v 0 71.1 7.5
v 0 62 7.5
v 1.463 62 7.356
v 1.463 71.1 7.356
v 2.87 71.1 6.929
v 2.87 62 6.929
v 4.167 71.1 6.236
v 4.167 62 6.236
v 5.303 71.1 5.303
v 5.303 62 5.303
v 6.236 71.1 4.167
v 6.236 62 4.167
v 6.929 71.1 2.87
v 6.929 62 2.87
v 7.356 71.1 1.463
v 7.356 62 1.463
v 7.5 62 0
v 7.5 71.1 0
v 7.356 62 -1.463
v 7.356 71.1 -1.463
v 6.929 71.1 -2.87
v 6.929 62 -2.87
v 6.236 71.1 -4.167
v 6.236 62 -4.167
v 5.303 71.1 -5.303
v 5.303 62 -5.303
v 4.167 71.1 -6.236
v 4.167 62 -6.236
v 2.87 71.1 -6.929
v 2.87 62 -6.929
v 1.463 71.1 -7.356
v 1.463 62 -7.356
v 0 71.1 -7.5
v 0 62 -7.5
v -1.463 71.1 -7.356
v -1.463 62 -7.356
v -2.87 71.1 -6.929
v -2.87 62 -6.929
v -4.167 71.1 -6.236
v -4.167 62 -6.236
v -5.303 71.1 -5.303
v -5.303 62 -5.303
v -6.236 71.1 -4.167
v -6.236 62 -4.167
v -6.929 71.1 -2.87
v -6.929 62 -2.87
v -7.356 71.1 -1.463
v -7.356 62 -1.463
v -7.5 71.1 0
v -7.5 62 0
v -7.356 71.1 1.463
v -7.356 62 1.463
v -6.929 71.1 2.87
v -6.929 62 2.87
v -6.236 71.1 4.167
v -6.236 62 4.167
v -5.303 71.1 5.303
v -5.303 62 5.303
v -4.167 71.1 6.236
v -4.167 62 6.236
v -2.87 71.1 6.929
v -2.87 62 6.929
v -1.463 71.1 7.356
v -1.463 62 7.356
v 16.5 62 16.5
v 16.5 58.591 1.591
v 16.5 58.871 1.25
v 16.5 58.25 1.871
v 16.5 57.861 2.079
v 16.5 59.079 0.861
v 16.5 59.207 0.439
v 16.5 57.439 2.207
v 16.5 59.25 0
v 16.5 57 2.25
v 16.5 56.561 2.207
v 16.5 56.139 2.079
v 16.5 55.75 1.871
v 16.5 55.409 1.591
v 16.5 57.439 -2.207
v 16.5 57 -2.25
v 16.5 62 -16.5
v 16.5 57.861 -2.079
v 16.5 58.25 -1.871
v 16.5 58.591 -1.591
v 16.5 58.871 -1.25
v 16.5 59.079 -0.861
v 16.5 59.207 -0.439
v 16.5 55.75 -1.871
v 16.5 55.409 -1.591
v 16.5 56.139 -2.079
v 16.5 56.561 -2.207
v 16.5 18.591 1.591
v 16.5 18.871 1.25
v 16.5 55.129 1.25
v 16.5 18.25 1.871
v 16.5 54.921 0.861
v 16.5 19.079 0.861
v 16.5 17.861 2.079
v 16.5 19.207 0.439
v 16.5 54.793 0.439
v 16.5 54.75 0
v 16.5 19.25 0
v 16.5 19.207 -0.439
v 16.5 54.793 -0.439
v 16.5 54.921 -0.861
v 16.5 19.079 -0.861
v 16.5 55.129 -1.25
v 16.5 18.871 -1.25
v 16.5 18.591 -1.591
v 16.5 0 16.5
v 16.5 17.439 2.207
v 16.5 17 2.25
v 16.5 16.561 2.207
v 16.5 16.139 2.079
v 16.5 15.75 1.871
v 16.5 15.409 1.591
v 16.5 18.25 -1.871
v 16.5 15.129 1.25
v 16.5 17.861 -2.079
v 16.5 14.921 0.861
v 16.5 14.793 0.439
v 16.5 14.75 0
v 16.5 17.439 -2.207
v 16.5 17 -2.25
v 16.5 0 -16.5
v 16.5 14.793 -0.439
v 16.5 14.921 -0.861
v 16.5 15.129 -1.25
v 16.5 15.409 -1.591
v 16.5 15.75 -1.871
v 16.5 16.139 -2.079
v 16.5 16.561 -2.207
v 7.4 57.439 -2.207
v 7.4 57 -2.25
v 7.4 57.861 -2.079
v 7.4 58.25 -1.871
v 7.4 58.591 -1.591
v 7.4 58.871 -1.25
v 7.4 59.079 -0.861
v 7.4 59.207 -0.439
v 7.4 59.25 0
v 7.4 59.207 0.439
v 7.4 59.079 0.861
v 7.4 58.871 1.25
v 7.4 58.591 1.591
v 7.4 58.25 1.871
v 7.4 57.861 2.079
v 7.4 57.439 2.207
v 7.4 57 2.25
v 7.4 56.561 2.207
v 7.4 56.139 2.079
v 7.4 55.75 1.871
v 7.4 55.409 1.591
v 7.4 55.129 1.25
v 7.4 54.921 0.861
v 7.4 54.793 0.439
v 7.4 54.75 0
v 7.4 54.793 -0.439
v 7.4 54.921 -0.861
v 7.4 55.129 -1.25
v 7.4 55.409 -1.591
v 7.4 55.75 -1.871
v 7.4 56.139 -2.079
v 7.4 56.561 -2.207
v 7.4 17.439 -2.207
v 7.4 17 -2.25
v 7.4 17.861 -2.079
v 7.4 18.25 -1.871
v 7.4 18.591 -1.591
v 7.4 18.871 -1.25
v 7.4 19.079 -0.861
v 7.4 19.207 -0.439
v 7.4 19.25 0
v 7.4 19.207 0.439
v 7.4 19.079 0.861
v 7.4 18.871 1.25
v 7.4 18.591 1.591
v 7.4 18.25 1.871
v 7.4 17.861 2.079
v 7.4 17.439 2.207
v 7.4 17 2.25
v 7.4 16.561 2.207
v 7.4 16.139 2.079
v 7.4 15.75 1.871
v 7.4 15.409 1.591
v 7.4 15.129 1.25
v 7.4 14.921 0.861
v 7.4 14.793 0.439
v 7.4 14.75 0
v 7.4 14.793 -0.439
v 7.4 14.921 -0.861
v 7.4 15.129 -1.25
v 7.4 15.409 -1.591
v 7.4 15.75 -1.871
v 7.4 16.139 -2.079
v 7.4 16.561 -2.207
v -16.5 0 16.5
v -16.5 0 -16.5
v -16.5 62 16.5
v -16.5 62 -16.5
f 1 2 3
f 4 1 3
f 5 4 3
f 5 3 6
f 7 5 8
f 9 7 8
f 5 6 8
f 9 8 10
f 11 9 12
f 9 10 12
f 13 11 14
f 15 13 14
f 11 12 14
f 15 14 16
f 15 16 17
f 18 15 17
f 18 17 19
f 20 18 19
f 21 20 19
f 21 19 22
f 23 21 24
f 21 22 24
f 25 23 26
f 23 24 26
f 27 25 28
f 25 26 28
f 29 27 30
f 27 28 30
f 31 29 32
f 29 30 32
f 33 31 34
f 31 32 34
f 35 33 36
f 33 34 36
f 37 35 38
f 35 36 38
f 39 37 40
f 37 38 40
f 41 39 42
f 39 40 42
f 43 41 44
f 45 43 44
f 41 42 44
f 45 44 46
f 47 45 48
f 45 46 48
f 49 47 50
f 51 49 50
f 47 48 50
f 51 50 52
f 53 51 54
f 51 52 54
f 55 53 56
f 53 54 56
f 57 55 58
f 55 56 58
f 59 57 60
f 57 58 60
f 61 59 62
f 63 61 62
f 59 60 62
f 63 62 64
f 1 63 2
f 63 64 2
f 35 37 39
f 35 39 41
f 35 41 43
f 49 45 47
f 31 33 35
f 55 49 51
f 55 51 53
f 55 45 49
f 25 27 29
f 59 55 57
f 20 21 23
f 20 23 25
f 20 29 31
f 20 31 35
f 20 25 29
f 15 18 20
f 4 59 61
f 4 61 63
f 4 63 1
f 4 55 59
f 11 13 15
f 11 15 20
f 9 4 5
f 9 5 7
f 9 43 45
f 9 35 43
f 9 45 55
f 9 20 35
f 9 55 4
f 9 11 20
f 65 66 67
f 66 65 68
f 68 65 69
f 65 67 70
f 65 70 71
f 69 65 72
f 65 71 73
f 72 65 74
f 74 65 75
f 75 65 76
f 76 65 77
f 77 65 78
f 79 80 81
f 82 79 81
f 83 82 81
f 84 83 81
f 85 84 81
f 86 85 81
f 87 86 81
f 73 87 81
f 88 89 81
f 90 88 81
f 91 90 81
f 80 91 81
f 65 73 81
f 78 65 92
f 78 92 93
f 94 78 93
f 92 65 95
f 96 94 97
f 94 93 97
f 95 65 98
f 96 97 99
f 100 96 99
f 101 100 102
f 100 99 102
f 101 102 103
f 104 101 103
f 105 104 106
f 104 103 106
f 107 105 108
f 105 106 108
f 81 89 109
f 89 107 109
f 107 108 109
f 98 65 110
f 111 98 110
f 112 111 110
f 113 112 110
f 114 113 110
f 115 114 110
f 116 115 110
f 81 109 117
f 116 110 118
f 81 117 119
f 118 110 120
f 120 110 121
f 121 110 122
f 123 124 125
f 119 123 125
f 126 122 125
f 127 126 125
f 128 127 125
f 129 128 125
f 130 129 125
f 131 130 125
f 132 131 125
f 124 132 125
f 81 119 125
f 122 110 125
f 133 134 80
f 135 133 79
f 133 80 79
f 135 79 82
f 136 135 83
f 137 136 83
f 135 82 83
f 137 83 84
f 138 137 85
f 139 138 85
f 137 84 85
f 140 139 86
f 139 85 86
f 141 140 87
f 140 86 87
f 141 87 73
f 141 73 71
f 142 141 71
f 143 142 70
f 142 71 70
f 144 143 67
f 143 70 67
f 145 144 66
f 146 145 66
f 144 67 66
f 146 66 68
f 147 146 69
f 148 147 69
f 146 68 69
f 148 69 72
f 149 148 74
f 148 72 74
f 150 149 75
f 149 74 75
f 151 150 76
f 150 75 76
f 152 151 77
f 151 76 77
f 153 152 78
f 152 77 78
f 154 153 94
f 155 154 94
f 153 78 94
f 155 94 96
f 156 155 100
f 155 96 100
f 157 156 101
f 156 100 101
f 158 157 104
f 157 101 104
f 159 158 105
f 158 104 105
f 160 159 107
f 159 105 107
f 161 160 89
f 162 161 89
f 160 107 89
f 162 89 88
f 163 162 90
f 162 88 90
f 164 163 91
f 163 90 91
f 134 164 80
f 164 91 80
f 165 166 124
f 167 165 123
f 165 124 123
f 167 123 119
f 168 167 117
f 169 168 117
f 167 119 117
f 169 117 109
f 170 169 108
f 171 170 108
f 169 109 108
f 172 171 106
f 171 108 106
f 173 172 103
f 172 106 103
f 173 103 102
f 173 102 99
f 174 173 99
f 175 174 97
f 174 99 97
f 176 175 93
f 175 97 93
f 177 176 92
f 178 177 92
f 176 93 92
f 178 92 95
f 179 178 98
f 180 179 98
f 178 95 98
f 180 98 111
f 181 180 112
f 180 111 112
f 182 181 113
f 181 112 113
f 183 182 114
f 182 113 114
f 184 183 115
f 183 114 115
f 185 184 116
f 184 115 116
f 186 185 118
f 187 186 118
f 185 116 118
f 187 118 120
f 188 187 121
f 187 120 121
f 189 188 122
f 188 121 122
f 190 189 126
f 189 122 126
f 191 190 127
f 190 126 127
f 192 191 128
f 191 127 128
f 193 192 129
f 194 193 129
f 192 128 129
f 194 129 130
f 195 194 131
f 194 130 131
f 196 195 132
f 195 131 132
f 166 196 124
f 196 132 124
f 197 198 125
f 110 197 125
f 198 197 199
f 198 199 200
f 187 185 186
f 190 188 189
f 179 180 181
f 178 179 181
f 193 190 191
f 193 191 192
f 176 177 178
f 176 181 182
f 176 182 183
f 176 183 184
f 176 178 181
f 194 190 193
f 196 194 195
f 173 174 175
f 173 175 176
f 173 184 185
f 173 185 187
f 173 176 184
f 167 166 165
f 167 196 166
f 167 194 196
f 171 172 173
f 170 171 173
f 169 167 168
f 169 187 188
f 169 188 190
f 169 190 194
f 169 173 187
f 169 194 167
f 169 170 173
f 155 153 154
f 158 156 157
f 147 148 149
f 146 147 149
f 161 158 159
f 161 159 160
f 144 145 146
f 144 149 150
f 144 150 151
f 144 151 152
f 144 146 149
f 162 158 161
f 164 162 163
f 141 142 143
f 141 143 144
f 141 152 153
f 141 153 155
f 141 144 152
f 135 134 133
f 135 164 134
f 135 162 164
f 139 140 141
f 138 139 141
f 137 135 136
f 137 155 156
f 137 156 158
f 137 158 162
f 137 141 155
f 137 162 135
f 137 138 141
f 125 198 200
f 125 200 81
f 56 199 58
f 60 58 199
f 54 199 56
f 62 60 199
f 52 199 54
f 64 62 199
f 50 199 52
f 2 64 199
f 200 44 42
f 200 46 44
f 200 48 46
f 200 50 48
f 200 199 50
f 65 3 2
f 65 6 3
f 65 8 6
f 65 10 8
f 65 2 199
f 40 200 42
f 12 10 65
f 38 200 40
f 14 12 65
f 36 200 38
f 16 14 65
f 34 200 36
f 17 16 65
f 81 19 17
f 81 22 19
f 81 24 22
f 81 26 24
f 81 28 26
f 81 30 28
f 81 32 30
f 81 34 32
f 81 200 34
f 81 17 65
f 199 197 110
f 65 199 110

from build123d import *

# Parameters (mm, degrees)
SKETCH1_W           = 33
SKETCH1_H           = 33
BOSS_EXTRUDE1_DEPTH = 62
SKETCH2_R           = 7.5
BOSS_EXTRUDE2_DEPTH = 9.1
SKETCH3_R           = 2.25
CUT_EXTRUDE1_DEPTH  = 9.1


with BuildPart() as part:
    # Sketch1 → Boss-Extrude1 (new body)
    with BuildSketch(Plane(origin=(0, 0, 0), x_dir=(1, 0, 0), z_dir=(0, 1, 0))):
        Rectangle(SKETCH1_W, SKETCH1_H)
    extrude(amount=BOSS_EXTRUDE1_DEPTH)

    # Sketch2 → Boss-Extrude2 (add)
    with BuildSketch(Plane(origin=(0, 62, 0), x_dir=(1, 0, 0), z_dir=(0, 1, 0))):
        with Locations(Location((0, 0, 0), (0, 0, 270))):
            Circle(SKETCH2_R)
    extrude(amount=BOSS_EXTRUDE2_DEPTH)

    # Sketch3 → Cut-Extrude1 (cut)
    with BuildSketch(Plane(origin=(16.5, 0, 0), x_dir=(0, 0, -1), z_dir=(1, 0, 0))):
        with Locations((0, 57)):
            Circle(SKETCH3_R)
        with Locations((0, 17)):
            Circle(SKETCH3_R)
    extrude(amount=-CUT_EXTRUDE1_DEPTH, mode=Mode.SUBTRACT)


solid = part.part
